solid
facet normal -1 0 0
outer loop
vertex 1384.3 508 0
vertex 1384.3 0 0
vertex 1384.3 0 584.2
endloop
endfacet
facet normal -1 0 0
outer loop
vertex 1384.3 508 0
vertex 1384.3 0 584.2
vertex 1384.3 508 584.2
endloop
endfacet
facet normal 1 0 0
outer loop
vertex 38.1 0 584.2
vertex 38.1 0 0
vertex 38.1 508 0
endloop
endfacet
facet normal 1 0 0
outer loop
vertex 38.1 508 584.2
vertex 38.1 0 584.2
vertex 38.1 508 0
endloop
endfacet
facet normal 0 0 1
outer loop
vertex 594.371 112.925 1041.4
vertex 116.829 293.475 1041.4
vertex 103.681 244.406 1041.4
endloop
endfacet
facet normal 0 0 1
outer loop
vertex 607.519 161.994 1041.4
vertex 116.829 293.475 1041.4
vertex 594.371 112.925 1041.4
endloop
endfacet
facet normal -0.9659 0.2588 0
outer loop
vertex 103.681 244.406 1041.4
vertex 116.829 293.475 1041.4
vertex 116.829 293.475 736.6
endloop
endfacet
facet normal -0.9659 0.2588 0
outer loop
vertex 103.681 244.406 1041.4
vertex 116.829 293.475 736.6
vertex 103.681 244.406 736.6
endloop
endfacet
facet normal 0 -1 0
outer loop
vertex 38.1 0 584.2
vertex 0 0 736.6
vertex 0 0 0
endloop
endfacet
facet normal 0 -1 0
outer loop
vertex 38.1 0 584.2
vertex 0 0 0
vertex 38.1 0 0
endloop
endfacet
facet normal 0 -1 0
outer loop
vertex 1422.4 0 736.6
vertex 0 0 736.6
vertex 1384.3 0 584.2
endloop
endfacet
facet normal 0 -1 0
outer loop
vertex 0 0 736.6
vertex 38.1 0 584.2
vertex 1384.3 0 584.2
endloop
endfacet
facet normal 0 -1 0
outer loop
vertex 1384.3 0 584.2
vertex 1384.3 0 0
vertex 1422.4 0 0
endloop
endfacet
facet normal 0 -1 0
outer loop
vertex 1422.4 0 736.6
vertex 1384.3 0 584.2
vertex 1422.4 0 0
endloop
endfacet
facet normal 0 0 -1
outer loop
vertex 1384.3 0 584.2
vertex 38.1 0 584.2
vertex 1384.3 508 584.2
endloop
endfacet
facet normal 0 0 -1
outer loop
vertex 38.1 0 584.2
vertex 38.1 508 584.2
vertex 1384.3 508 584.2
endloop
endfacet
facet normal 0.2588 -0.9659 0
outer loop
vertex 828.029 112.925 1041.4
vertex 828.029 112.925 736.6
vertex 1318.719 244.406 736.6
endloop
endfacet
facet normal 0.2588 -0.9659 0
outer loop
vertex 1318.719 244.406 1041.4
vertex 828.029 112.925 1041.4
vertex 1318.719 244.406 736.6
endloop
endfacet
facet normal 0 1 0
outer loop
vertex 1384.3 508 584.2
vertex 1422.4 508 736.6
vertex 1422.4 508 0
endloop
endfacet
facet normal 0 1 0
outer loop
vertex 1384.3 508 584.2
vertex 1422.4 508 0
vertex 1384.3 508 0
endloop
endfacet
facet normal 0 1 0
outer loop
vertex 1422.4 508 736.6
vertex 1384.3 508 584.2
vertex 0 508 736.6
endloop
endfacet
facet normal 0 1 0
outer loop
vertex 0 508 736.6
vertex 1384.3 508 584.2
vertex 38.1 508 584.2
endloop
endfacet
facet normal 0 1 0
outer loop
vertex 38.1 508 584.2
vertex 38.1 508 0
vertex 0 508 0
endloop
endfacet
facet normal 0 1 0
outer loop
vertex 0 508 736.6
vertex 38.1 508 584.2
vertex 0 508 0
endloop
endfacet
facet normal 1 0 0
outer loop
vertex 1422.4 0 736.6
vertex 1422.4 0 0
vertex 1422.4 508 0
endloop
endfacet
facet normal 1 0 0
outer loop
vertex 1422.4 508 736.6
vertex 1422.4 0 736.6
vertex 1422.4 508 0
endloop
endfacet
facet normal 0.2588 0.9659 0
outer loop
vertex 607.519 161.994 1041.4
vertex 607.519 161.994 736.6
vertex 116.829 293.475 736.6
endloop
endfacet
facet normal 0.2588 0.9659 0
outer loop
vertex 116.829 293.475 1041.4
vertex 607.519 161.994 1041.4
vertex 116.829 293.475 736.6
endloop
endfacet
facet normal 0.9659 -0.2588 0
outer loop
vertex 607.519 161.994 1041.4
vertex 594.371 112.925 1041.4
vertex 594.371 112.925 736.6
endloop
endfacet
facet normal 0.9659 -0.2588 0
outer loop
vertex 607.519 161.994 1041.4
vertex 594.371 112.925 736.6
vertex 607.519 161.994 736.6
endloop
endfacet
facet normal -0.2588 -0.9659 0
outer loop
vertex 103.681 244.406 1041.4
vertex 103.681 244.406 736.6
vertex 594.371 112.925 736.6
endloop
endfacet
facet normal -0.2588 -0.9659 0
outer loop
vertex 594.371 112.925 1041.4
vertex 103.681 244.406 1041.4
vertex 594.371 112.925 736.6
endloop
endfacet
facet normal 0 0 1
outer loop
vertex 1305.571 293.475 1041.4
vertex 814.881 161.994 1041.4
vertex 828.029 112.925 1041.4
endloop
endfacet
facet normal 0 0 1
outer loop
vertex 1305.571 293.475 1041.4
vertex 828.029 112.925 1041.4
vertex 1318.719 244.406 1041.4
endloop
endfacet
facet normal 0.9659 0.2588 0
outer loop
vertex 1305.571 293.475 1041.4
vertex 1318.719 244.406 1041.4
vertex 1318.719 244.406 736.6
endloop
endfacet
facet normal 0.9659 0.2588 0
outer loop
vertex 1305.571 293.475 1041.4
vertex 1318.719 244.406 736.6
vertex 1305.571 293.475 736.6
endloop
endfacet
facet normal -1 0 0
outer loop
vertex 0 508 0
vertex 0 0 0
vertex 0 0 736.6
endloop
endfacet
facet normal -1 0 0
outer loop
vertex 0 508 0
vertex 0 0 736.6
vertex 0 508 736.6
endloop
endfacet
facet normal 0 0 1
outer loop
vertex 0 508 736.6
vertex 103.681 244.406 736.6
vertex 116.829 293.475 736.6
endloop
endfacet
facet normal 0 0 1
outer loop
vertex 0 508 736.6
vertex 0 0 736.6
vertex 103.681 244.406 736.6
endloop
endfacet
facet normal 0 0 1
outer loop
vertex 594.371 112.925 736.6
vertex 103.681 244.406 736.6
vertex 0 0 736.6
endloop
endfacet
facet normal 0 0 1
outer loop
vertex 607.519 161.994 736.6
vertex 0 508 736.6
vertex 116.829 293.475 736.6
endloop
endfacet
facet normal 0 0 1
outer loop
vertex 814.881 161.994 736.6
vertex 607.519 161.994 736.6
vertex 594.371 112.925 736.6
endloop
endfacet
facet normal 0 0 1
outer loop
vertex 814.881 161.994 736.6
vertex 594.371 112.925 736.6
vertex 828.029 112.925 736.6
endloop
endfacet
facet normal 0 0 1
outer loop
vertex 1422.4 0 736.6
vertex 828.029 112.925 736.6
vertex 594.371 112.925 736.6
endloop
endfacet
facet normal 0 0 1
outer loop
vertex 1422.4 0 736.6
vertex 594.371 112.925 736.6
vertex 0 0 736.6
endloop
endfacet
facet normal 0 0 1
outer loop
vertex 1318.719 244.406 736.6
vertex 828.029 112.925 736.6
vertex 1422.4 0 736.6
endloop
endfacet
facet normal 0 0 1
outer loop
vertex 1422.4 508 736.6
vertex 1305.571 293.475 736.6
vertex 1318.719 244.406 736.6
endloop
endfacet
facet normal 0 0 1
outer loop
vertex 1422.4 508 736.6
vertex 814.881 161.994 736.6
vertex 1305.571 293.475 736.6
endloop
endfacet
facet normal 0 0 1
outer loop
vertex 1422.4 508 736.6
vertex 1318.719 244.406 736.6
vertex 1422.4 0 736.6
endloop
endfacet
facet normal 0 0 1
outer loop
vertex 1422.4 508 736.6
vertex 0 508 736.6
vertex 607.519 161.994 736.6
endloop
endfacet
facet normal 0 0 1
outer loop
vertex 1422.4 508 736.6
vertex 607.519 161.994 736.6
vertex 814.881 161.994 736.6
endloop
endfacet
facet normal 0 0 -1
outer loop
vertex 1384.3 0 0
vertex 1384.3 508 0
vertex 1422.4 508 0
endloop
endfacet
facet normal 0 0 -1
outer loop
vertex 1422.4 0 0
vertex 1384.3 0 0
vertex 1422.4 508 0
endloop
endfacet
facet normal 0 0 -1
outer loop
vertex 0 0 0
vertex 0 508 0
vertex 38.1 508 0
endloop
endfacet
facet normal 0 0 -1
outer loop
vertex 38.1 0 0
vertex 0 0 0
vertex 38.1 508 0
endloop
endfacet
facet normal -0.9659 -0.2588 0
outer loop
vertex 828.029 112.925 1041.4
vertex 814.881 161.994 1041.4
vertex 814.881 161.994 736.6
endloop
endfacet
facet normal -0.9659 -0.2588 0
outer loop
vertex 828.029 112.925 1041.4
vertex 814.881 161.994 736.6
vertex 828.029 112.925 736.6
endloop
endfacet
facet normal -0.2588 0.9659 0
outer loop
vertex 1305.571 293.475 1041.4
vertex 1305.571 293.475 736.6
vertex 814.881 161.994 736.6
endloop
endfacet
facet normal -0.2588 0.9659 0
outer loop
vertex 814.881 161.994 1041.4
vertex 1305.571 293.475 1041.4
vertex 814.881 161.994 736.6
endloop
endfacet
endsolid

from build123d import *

# Parameters (mm, degrees)
F0_W     = 38.1
F0_H     = 508
F1_DEPTH = 584.2
F2_W     = 1384.3
F2_H     = 508
F2_W_2   = 38.1
F3_DEPTH = 152.4
F5_DEPTH = 304.8


with BuildPart() as f1:
    # F0 (on Top) → F1 (new body)
    with BuildSketch(Plane.XY):
        with Locations((19.05, 254)):
            Rectangle(F0_W, F0_H)
        with Locations((1403.35, 254)):
            Rectangle(F0_W, F0_H)
    extrude(amount=F1_DEPTH)

    # F2 (on face) → F3 (join)
    with BuildSketch(Plane.XY.offset(584.2)):
        with Locations((730.25, 254)):
            Rectangle(F2_W, F2_H)
        with Locations((19.05, 254)):
            Rectangle(F2_W_2, F2_H)
    extrude(amount=F3_DEPTH)

    # F4 (on face) → F5 (join)
    with BuildSketch(Plane.XY.offset(736.6)):
        Polygon((594.371156, 112.925447), (607.519164, 161.994479), (116.828844, 293.474553), (103.680836, 244.405521), align=None)
        Polygon((1318.719164, 244.405521), (1305.571156, 293.474553), (814.880836, 161.994479), (828.028844, 112.925447), align=None)
    extrude(amount=F5_DEPTH)


solid = f1.part
